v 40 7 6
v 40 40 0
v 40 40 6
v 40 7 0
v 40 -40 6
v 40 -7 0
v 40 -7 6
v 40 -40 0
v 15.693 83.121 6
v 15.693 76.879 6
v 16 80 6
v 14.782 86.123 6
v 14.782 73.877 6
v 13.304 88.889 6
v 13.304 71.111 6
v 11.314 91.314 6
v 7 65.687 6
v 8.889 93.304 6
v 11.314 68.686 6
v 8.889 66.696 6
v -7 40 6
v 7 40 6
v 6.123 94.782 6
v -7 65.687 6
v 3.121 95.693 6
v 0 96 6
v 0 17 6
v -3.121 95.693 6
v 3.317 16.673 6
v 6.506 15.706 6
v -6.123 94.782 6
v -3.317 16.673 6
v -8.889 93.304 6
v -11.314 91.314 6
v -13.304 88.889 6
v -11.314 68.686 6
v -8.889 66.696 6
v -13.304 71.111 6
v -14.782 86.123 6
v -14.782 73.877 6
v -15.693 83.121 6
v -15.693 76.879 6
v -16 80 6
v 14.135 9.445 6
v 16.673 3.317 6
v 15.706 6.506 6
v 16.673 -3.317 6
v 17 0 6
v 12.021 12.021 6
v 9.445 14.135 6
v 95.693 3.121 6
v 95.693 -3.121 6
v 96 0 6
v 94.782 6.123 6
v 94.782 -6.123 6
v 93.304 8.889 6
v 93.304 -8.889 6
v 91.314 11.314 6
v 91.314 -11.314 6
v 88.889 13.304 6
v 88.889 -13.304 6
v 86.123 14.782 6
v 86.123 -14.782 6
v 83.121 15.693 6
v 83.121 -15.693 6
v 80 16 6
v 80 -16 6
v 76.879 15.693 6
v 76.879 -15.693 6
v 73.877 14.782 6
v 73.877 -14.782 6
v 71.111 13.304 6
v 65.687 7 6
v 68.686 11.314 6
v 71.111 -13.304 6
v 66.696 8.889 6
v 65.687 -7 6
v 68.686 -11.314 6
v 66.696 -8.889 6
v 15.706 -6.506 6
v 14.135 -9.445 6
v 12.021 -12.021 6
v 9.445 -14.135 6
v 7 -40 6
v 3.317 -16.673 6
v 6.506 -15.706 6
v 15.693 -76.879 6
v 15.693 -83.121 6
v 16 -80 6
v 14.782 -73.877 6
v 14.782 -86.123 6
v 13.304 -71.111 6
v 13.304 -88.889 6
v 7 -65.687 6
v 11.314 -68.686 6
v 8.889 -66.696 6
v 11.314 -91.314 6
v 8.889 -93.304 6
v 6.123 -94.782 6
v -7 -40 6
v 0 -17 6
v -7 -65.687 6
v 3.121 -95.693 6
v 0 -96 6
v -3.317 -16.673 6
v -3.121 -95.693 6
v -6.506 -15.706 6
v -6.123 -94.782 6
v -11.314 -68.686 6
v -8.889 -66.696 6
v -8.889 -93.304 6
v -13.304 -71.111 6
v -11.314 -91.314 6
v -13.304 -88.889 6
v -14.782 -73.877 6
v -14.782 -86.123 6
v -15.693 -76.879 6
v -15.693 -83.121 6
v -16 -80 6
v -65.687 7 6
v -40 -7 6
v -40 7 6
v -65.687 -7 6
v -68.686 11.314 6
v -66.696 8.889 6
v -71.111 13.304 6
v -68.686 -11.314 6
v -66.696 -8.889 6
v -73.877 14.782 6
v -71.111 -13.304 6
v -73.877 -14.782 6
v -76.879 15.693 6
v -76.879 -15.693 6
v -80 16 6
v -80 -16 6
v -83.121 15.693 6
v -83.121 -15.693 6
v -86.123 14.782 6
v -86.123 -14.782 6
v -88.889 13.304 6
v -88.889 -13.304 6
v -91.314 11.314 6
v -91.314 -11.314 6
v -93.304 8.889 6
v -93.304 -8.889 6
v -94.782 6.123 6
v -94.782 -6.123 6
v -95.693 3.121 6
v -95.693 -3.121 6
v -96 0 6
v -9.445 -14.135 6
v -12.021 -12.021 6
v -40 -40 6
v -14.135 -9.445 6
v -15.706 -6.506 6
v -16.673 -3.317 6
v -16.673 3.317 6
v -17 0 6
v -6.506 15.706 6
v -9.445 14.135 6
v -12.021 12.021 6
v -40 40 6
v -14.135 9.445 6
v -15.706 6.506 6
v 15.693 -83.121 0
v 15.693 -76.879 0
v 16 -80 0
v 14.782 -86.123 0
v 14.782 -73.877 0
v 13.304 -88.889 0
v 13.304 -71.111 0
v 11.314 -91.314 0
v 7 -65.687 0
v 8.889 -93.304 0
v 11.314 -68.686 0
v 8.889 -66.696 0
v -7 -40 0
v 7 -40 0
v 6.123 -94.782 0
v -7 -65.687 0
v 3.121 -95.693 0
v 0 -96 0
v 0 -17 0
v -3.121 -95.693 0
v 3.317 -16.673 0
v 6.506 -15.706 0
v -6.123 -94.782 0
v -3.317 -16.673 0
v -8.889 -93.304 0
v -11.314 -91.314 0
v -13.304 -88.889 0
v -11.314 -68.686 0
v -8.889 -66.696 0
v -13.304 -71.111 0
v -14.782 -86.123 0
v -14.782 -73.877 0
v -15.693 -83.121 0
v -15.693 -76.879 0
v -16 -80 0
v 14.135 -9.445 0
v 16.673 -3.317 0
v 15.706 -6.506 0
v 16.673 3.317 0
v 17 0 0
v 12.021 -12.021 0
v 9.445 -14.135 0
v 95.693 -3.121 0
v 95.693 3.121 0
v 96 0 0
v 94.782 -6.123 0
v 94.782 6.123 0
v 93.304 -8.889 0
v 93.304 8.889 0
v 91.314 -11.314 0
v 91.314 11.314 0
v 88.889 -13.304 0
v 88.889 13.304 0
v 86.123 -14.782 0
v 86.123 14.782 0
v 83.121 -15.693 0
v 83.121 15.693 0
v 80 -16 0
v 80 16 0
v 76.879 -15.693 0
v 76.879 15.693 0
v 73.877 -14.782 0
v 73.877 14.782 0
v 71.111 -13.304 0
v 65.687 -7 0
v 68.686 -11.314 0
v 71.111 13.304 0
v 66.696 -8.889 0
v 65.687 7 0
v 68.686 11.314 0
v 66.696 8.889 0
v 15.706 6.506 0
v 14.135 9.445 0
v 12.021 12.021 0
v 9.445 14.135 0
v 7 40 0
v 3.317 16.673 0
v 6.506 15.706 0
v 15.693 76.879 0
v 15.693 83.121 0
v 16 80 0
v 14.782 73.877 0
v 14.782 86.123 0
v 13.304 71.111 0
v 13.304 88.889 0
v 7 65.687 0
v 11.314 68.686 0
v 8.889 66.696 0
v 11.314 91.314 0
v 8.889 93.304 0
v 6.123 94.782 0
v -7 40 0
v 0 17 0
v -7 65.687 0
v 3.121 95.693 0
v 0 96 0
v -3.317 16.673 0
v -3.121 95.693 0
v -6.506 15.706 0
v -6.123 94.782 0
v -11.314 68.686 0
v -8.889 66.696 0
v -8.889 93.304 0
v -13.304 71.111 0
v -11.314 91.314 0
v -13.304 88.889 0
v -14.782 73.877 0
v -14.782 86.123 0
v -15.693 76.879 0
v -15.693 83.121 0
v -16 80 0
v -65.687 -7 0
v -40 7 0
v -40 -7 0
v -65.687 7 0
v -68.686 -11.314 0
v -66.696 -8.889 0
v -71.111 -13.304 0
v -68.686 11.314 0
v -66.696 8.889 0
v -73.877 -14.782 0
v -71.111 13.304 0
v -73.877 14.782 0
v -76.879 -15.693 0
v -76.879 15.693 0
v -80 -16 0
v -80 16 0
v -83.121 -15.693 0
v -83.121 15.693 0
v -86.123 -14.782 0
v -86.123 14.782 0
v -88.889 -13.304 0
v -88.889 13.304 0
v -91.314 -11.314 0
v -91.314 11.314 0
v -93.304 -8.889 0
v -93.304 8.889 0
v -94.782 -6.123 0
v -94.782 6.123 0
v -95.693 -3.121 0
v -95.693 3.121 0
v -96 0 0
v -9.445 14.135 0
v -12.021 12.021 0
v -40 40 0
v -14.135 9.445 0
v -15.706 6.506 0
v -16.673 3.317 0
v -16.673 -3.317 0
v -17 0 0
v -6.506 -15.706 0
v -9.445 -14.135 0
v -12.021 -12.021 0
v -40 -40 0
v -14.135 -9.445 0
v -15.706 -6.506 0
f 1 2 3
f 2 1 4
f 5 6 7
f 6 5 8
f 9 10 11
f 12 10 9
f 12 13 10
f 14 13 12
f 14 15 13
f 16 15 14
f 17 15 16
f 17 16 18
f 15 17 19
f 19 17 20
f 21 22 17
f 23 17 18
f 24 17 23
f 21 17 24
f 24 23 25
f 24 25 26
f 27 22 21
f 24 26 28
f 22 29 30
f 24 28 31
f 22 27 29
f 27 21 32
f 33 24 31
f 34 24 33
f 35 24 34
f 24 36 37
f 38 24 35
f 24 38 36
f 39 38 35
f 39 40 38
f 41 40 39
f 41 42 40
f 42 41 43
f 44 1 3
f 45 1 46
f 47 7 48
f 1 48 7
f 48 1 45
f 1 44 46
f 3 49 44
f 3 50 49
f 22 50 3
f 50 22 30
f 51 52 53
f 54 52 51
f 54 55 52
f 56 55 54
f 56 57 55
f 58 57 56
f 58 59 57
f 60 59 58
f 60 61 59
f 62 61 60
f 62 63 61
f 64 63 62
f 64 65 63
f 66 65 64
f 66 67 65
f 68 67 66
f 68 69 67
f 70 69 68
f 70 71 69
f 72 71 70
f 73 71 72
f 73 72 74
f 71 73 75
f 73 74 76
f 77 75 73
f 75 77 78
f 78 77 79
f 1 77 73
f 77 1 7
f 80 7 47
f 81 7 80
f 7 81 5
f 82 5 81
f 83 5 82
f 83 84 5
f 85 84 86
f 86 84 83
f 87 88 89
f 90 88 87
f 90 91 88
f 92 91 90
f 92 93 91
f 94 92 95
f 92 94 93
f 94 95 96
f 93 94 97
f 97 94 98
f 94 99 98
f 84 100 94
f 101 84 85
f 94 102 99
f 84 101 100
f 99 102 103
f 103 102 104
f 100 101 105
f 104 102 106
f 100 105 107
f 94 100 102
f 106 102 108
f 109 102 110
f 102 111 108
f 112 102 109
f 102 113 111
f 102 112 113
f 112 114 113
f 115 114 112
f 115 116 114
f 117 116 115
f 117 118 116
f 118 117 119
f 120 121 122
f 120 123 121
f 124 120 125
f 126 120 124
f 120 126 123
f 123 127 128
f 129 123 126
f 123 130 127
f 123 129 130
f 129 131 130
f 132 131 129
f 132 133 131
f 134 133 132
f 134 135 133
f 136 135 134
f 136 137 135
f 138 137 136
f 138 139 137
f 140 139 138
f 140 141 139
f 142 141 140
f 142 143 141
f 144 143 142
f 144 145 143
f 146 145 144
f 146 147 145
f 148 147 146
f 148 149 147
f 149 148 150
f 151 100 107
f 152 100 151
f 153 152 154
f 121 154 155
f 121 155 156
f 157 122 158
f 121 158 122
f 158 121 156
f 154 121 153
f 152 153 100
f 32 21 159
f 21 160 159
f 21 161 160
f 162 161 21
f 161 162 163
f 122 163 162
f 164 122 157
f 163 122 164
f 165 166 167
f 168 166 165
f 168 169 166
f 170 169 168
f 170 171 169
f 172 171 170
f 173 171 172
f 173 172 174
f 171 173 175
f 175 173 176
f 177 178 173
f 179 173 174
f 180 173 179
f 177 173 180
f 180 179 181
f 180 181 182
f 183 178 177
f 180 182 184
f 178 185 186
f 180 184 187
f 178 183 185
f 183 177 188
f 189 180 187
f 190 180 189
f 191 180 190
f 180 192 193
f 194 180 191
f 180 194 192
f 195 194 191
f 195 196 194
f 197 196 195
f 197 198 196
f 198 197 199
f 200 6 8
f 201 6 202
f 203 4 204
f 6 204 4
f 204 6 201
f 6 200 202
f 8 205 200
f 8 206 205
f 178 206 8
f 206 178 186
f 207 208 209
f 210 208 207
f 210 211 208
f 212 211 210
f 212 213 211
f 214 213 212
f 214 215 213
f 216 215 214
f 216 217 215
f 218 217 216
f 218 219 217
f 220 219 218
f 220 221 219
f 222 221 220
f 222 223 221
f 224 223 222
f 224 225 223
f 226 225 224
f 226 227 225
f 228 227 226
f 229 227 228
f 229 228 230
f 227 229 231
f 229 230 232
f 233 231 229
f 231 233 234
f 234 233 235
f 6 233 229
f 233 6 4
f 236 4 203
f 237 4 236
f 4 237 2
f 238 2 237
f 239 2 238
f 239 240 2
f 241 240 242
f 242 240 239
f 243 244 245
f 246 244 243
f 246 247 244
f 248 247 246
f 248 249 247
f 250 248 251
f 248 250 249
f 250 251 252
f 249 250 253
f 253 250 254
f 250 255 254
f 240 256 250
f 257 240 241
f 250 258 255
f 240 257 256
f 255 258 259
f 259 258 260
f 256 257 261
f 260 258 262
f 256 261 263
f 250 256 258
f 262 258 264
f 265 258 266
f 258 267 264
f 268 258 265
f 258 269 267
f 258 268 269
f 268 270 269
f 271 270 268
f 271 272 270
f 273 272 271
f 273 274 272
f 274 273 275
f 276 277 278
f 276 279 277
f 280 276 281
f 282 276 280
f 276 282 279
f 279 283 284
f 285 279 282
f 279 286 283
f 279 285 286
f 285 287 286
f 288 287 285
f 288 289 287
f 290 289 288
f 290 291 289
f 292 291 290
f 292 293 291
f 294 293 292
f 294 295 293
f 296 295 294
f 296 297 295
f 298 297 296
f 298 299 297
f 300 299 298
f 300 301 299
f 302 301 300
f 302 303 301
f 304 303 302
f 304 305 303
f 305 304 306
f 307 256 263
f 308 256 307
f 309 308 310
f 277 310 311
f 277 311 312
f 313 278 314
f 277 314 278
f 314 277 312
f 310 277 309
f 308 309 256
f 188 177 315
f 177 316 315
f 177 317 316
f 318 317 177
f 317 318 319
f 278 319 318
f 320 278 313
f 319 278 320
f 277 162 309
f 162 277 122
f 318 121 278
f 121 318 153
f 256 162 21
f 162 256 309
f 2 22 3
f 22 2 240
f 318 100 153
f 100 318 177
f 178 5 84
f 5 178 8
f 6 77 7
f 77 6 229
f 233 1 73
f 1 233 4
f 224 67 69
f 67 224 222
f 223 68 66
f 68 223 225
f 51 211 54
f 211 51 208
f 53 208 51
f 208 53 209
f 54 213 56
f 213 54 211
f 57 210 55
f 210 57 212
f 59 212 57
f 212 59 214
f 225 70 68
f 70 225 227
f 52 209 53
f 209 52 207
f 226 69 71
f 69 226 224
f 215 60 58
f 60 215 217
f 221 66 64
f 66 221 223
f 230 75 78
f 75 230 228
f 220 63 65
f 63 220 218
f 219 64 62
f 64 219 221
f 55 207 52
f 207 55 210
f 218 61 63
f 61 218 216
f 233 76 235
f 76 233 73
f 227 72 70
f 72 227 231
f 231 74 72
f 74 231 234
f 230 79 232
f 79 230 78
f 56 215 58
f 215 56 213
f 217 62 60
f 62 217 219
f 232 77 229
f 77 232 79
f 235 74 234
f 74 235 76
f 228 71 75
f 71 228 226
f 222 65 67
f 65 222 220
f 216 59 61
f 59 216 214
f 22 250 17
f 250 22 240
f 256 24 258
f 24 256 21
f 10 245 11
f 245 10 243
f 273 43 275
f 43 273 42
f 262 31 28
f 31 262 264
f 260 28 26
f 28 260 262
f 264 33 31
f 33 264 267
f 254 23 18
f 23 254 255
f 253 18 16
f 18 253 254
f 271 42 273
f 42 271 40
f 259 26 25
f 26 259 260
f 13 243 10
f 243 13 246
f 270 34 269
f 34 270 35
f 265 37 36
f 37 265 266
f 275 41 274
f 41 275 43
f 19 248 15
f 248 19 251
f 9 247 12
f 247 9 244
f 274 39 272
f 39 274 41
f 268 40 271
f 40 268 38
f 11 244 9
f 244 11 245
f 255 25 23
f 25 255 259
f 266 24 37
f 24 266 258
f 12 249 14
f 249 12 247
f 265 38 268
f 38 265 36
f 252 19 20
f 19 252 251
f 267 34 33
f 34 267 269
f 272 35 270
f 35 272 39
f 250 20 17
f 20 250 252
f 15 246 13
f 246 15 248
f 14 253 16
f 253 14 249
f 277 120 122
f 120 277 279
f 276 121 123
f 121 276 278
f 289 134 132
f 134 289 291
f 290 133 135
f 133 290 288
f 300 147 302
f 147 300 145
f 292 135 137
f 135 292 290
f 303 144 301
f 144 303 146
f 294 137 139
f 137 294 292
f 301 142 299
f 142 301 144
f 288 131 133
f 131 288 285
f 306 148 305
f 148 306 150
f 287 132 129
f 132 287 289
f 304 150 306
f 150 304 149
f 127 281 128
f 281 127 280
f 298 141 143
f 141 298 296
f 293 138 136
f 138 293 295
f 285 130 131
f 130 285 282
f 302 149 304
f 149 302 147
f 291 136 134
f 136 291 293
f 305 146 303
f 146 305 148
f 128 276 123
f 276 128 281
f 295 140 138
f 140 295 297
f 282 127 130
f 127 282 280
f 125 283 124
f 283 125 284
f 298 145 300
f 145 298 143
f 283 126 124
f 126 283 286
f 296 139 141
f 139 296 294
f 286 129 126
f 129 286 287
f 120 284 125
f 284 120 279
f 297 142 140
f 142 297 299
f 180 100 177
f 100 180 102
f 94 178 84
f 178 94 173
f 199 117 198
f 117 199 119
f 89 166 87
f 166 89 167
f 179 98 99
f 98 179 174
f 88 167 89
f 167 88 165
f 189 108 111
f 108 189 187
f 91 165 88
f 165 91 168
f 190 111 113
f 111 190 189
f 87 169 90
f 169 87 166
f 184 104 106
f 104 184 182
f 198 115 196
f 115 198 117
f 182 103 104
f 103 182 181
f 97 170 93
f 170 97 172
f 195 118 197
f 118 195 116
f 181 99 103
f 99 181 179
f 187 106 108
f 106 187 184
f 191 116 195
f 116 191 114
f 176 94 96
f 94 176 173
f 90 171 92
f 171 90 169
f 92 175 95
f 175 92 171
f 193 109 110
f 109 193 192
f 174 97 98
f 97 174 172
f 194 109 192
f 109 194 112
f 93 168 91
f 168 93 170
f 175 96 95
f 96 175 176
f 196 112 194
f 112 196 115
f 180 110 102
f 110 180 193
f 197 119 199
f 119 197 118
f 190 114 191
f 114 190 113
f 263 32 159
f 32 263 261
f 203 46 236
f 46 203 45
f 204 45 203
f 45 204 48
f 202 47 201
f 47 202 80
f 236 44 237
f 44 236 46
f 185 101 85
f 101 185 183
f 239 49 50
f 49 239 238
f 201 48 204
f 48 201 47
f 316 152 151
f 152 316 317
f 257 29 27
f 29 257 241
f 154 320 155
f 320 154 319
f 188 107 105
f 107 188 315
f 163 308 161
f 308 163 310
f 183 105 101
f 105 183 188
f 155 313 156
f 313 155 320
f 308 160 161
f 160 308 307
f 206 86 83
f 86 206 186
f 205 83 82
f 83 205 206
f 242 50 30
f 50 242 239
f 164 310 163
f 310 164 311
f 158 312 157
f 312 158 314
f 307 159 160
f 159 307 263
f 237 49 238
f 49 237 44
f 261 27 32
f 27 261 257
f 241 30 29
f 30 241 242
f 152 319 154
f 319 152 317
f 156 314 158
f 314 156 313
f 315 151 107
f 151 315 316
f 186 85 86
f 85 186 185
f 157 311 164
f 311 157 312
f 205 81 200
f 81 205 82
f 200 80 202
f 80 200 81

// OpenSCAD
$fn = 32;

// ----------------------------------------------------------------------
// Quadcopter frame: 192 mm across the motor pads, arms 80 mm
// ----------------------------------------------------------------------

// --- parameters (mm) ---
hub = 80;                 // central plate size
plate_t = 6;              // plate thickness
arm_len = 80;             // hub centre to motor pad centre
bar_w = 14;               // arm width
pad_d = 32;               // motor pad diameter
centre_d = 34;            // central cut-out for the stack

module arm_bar() {
  /* flat bar: hull of a stub inside the hub and a box at the pad */
  hull() {
    translate([hub / 4, 0, plate_t / 2]) cube([bar_w, bar_w, plate_t], center = true);
    translate([arm_len, 0, plate_t / 2]) cube([bar_w, bar_w, plate_t], center = true);
  }
}

module pad() {
  translate([arm_len, 0, 0]) cylinder(h = plate_t, d = pad_d);
}

module frame() {
  translate([-hub / 2, -hub / 2, 0]) cube([hub, hub, plate_t]);
  rotate([0, 0, 0]) arm_bar();
  rotate([0, 0, 0]) pad();
  rotate([0, 0, 90]) arm_bar();
  rotate([0, 0, 90]) pad();
  rotate([0, 0, 180]) arm_bar();
  rotate([0, 0, 180]) pad();
  rotate([0, 0, 270]) arm_bar();
  rotate([0, 0, 270]) pad();
}

difference() {
  frame();
  translate([0, 0, -1]) cylinder(h = plate_t + 2, d = centre_d);
}
